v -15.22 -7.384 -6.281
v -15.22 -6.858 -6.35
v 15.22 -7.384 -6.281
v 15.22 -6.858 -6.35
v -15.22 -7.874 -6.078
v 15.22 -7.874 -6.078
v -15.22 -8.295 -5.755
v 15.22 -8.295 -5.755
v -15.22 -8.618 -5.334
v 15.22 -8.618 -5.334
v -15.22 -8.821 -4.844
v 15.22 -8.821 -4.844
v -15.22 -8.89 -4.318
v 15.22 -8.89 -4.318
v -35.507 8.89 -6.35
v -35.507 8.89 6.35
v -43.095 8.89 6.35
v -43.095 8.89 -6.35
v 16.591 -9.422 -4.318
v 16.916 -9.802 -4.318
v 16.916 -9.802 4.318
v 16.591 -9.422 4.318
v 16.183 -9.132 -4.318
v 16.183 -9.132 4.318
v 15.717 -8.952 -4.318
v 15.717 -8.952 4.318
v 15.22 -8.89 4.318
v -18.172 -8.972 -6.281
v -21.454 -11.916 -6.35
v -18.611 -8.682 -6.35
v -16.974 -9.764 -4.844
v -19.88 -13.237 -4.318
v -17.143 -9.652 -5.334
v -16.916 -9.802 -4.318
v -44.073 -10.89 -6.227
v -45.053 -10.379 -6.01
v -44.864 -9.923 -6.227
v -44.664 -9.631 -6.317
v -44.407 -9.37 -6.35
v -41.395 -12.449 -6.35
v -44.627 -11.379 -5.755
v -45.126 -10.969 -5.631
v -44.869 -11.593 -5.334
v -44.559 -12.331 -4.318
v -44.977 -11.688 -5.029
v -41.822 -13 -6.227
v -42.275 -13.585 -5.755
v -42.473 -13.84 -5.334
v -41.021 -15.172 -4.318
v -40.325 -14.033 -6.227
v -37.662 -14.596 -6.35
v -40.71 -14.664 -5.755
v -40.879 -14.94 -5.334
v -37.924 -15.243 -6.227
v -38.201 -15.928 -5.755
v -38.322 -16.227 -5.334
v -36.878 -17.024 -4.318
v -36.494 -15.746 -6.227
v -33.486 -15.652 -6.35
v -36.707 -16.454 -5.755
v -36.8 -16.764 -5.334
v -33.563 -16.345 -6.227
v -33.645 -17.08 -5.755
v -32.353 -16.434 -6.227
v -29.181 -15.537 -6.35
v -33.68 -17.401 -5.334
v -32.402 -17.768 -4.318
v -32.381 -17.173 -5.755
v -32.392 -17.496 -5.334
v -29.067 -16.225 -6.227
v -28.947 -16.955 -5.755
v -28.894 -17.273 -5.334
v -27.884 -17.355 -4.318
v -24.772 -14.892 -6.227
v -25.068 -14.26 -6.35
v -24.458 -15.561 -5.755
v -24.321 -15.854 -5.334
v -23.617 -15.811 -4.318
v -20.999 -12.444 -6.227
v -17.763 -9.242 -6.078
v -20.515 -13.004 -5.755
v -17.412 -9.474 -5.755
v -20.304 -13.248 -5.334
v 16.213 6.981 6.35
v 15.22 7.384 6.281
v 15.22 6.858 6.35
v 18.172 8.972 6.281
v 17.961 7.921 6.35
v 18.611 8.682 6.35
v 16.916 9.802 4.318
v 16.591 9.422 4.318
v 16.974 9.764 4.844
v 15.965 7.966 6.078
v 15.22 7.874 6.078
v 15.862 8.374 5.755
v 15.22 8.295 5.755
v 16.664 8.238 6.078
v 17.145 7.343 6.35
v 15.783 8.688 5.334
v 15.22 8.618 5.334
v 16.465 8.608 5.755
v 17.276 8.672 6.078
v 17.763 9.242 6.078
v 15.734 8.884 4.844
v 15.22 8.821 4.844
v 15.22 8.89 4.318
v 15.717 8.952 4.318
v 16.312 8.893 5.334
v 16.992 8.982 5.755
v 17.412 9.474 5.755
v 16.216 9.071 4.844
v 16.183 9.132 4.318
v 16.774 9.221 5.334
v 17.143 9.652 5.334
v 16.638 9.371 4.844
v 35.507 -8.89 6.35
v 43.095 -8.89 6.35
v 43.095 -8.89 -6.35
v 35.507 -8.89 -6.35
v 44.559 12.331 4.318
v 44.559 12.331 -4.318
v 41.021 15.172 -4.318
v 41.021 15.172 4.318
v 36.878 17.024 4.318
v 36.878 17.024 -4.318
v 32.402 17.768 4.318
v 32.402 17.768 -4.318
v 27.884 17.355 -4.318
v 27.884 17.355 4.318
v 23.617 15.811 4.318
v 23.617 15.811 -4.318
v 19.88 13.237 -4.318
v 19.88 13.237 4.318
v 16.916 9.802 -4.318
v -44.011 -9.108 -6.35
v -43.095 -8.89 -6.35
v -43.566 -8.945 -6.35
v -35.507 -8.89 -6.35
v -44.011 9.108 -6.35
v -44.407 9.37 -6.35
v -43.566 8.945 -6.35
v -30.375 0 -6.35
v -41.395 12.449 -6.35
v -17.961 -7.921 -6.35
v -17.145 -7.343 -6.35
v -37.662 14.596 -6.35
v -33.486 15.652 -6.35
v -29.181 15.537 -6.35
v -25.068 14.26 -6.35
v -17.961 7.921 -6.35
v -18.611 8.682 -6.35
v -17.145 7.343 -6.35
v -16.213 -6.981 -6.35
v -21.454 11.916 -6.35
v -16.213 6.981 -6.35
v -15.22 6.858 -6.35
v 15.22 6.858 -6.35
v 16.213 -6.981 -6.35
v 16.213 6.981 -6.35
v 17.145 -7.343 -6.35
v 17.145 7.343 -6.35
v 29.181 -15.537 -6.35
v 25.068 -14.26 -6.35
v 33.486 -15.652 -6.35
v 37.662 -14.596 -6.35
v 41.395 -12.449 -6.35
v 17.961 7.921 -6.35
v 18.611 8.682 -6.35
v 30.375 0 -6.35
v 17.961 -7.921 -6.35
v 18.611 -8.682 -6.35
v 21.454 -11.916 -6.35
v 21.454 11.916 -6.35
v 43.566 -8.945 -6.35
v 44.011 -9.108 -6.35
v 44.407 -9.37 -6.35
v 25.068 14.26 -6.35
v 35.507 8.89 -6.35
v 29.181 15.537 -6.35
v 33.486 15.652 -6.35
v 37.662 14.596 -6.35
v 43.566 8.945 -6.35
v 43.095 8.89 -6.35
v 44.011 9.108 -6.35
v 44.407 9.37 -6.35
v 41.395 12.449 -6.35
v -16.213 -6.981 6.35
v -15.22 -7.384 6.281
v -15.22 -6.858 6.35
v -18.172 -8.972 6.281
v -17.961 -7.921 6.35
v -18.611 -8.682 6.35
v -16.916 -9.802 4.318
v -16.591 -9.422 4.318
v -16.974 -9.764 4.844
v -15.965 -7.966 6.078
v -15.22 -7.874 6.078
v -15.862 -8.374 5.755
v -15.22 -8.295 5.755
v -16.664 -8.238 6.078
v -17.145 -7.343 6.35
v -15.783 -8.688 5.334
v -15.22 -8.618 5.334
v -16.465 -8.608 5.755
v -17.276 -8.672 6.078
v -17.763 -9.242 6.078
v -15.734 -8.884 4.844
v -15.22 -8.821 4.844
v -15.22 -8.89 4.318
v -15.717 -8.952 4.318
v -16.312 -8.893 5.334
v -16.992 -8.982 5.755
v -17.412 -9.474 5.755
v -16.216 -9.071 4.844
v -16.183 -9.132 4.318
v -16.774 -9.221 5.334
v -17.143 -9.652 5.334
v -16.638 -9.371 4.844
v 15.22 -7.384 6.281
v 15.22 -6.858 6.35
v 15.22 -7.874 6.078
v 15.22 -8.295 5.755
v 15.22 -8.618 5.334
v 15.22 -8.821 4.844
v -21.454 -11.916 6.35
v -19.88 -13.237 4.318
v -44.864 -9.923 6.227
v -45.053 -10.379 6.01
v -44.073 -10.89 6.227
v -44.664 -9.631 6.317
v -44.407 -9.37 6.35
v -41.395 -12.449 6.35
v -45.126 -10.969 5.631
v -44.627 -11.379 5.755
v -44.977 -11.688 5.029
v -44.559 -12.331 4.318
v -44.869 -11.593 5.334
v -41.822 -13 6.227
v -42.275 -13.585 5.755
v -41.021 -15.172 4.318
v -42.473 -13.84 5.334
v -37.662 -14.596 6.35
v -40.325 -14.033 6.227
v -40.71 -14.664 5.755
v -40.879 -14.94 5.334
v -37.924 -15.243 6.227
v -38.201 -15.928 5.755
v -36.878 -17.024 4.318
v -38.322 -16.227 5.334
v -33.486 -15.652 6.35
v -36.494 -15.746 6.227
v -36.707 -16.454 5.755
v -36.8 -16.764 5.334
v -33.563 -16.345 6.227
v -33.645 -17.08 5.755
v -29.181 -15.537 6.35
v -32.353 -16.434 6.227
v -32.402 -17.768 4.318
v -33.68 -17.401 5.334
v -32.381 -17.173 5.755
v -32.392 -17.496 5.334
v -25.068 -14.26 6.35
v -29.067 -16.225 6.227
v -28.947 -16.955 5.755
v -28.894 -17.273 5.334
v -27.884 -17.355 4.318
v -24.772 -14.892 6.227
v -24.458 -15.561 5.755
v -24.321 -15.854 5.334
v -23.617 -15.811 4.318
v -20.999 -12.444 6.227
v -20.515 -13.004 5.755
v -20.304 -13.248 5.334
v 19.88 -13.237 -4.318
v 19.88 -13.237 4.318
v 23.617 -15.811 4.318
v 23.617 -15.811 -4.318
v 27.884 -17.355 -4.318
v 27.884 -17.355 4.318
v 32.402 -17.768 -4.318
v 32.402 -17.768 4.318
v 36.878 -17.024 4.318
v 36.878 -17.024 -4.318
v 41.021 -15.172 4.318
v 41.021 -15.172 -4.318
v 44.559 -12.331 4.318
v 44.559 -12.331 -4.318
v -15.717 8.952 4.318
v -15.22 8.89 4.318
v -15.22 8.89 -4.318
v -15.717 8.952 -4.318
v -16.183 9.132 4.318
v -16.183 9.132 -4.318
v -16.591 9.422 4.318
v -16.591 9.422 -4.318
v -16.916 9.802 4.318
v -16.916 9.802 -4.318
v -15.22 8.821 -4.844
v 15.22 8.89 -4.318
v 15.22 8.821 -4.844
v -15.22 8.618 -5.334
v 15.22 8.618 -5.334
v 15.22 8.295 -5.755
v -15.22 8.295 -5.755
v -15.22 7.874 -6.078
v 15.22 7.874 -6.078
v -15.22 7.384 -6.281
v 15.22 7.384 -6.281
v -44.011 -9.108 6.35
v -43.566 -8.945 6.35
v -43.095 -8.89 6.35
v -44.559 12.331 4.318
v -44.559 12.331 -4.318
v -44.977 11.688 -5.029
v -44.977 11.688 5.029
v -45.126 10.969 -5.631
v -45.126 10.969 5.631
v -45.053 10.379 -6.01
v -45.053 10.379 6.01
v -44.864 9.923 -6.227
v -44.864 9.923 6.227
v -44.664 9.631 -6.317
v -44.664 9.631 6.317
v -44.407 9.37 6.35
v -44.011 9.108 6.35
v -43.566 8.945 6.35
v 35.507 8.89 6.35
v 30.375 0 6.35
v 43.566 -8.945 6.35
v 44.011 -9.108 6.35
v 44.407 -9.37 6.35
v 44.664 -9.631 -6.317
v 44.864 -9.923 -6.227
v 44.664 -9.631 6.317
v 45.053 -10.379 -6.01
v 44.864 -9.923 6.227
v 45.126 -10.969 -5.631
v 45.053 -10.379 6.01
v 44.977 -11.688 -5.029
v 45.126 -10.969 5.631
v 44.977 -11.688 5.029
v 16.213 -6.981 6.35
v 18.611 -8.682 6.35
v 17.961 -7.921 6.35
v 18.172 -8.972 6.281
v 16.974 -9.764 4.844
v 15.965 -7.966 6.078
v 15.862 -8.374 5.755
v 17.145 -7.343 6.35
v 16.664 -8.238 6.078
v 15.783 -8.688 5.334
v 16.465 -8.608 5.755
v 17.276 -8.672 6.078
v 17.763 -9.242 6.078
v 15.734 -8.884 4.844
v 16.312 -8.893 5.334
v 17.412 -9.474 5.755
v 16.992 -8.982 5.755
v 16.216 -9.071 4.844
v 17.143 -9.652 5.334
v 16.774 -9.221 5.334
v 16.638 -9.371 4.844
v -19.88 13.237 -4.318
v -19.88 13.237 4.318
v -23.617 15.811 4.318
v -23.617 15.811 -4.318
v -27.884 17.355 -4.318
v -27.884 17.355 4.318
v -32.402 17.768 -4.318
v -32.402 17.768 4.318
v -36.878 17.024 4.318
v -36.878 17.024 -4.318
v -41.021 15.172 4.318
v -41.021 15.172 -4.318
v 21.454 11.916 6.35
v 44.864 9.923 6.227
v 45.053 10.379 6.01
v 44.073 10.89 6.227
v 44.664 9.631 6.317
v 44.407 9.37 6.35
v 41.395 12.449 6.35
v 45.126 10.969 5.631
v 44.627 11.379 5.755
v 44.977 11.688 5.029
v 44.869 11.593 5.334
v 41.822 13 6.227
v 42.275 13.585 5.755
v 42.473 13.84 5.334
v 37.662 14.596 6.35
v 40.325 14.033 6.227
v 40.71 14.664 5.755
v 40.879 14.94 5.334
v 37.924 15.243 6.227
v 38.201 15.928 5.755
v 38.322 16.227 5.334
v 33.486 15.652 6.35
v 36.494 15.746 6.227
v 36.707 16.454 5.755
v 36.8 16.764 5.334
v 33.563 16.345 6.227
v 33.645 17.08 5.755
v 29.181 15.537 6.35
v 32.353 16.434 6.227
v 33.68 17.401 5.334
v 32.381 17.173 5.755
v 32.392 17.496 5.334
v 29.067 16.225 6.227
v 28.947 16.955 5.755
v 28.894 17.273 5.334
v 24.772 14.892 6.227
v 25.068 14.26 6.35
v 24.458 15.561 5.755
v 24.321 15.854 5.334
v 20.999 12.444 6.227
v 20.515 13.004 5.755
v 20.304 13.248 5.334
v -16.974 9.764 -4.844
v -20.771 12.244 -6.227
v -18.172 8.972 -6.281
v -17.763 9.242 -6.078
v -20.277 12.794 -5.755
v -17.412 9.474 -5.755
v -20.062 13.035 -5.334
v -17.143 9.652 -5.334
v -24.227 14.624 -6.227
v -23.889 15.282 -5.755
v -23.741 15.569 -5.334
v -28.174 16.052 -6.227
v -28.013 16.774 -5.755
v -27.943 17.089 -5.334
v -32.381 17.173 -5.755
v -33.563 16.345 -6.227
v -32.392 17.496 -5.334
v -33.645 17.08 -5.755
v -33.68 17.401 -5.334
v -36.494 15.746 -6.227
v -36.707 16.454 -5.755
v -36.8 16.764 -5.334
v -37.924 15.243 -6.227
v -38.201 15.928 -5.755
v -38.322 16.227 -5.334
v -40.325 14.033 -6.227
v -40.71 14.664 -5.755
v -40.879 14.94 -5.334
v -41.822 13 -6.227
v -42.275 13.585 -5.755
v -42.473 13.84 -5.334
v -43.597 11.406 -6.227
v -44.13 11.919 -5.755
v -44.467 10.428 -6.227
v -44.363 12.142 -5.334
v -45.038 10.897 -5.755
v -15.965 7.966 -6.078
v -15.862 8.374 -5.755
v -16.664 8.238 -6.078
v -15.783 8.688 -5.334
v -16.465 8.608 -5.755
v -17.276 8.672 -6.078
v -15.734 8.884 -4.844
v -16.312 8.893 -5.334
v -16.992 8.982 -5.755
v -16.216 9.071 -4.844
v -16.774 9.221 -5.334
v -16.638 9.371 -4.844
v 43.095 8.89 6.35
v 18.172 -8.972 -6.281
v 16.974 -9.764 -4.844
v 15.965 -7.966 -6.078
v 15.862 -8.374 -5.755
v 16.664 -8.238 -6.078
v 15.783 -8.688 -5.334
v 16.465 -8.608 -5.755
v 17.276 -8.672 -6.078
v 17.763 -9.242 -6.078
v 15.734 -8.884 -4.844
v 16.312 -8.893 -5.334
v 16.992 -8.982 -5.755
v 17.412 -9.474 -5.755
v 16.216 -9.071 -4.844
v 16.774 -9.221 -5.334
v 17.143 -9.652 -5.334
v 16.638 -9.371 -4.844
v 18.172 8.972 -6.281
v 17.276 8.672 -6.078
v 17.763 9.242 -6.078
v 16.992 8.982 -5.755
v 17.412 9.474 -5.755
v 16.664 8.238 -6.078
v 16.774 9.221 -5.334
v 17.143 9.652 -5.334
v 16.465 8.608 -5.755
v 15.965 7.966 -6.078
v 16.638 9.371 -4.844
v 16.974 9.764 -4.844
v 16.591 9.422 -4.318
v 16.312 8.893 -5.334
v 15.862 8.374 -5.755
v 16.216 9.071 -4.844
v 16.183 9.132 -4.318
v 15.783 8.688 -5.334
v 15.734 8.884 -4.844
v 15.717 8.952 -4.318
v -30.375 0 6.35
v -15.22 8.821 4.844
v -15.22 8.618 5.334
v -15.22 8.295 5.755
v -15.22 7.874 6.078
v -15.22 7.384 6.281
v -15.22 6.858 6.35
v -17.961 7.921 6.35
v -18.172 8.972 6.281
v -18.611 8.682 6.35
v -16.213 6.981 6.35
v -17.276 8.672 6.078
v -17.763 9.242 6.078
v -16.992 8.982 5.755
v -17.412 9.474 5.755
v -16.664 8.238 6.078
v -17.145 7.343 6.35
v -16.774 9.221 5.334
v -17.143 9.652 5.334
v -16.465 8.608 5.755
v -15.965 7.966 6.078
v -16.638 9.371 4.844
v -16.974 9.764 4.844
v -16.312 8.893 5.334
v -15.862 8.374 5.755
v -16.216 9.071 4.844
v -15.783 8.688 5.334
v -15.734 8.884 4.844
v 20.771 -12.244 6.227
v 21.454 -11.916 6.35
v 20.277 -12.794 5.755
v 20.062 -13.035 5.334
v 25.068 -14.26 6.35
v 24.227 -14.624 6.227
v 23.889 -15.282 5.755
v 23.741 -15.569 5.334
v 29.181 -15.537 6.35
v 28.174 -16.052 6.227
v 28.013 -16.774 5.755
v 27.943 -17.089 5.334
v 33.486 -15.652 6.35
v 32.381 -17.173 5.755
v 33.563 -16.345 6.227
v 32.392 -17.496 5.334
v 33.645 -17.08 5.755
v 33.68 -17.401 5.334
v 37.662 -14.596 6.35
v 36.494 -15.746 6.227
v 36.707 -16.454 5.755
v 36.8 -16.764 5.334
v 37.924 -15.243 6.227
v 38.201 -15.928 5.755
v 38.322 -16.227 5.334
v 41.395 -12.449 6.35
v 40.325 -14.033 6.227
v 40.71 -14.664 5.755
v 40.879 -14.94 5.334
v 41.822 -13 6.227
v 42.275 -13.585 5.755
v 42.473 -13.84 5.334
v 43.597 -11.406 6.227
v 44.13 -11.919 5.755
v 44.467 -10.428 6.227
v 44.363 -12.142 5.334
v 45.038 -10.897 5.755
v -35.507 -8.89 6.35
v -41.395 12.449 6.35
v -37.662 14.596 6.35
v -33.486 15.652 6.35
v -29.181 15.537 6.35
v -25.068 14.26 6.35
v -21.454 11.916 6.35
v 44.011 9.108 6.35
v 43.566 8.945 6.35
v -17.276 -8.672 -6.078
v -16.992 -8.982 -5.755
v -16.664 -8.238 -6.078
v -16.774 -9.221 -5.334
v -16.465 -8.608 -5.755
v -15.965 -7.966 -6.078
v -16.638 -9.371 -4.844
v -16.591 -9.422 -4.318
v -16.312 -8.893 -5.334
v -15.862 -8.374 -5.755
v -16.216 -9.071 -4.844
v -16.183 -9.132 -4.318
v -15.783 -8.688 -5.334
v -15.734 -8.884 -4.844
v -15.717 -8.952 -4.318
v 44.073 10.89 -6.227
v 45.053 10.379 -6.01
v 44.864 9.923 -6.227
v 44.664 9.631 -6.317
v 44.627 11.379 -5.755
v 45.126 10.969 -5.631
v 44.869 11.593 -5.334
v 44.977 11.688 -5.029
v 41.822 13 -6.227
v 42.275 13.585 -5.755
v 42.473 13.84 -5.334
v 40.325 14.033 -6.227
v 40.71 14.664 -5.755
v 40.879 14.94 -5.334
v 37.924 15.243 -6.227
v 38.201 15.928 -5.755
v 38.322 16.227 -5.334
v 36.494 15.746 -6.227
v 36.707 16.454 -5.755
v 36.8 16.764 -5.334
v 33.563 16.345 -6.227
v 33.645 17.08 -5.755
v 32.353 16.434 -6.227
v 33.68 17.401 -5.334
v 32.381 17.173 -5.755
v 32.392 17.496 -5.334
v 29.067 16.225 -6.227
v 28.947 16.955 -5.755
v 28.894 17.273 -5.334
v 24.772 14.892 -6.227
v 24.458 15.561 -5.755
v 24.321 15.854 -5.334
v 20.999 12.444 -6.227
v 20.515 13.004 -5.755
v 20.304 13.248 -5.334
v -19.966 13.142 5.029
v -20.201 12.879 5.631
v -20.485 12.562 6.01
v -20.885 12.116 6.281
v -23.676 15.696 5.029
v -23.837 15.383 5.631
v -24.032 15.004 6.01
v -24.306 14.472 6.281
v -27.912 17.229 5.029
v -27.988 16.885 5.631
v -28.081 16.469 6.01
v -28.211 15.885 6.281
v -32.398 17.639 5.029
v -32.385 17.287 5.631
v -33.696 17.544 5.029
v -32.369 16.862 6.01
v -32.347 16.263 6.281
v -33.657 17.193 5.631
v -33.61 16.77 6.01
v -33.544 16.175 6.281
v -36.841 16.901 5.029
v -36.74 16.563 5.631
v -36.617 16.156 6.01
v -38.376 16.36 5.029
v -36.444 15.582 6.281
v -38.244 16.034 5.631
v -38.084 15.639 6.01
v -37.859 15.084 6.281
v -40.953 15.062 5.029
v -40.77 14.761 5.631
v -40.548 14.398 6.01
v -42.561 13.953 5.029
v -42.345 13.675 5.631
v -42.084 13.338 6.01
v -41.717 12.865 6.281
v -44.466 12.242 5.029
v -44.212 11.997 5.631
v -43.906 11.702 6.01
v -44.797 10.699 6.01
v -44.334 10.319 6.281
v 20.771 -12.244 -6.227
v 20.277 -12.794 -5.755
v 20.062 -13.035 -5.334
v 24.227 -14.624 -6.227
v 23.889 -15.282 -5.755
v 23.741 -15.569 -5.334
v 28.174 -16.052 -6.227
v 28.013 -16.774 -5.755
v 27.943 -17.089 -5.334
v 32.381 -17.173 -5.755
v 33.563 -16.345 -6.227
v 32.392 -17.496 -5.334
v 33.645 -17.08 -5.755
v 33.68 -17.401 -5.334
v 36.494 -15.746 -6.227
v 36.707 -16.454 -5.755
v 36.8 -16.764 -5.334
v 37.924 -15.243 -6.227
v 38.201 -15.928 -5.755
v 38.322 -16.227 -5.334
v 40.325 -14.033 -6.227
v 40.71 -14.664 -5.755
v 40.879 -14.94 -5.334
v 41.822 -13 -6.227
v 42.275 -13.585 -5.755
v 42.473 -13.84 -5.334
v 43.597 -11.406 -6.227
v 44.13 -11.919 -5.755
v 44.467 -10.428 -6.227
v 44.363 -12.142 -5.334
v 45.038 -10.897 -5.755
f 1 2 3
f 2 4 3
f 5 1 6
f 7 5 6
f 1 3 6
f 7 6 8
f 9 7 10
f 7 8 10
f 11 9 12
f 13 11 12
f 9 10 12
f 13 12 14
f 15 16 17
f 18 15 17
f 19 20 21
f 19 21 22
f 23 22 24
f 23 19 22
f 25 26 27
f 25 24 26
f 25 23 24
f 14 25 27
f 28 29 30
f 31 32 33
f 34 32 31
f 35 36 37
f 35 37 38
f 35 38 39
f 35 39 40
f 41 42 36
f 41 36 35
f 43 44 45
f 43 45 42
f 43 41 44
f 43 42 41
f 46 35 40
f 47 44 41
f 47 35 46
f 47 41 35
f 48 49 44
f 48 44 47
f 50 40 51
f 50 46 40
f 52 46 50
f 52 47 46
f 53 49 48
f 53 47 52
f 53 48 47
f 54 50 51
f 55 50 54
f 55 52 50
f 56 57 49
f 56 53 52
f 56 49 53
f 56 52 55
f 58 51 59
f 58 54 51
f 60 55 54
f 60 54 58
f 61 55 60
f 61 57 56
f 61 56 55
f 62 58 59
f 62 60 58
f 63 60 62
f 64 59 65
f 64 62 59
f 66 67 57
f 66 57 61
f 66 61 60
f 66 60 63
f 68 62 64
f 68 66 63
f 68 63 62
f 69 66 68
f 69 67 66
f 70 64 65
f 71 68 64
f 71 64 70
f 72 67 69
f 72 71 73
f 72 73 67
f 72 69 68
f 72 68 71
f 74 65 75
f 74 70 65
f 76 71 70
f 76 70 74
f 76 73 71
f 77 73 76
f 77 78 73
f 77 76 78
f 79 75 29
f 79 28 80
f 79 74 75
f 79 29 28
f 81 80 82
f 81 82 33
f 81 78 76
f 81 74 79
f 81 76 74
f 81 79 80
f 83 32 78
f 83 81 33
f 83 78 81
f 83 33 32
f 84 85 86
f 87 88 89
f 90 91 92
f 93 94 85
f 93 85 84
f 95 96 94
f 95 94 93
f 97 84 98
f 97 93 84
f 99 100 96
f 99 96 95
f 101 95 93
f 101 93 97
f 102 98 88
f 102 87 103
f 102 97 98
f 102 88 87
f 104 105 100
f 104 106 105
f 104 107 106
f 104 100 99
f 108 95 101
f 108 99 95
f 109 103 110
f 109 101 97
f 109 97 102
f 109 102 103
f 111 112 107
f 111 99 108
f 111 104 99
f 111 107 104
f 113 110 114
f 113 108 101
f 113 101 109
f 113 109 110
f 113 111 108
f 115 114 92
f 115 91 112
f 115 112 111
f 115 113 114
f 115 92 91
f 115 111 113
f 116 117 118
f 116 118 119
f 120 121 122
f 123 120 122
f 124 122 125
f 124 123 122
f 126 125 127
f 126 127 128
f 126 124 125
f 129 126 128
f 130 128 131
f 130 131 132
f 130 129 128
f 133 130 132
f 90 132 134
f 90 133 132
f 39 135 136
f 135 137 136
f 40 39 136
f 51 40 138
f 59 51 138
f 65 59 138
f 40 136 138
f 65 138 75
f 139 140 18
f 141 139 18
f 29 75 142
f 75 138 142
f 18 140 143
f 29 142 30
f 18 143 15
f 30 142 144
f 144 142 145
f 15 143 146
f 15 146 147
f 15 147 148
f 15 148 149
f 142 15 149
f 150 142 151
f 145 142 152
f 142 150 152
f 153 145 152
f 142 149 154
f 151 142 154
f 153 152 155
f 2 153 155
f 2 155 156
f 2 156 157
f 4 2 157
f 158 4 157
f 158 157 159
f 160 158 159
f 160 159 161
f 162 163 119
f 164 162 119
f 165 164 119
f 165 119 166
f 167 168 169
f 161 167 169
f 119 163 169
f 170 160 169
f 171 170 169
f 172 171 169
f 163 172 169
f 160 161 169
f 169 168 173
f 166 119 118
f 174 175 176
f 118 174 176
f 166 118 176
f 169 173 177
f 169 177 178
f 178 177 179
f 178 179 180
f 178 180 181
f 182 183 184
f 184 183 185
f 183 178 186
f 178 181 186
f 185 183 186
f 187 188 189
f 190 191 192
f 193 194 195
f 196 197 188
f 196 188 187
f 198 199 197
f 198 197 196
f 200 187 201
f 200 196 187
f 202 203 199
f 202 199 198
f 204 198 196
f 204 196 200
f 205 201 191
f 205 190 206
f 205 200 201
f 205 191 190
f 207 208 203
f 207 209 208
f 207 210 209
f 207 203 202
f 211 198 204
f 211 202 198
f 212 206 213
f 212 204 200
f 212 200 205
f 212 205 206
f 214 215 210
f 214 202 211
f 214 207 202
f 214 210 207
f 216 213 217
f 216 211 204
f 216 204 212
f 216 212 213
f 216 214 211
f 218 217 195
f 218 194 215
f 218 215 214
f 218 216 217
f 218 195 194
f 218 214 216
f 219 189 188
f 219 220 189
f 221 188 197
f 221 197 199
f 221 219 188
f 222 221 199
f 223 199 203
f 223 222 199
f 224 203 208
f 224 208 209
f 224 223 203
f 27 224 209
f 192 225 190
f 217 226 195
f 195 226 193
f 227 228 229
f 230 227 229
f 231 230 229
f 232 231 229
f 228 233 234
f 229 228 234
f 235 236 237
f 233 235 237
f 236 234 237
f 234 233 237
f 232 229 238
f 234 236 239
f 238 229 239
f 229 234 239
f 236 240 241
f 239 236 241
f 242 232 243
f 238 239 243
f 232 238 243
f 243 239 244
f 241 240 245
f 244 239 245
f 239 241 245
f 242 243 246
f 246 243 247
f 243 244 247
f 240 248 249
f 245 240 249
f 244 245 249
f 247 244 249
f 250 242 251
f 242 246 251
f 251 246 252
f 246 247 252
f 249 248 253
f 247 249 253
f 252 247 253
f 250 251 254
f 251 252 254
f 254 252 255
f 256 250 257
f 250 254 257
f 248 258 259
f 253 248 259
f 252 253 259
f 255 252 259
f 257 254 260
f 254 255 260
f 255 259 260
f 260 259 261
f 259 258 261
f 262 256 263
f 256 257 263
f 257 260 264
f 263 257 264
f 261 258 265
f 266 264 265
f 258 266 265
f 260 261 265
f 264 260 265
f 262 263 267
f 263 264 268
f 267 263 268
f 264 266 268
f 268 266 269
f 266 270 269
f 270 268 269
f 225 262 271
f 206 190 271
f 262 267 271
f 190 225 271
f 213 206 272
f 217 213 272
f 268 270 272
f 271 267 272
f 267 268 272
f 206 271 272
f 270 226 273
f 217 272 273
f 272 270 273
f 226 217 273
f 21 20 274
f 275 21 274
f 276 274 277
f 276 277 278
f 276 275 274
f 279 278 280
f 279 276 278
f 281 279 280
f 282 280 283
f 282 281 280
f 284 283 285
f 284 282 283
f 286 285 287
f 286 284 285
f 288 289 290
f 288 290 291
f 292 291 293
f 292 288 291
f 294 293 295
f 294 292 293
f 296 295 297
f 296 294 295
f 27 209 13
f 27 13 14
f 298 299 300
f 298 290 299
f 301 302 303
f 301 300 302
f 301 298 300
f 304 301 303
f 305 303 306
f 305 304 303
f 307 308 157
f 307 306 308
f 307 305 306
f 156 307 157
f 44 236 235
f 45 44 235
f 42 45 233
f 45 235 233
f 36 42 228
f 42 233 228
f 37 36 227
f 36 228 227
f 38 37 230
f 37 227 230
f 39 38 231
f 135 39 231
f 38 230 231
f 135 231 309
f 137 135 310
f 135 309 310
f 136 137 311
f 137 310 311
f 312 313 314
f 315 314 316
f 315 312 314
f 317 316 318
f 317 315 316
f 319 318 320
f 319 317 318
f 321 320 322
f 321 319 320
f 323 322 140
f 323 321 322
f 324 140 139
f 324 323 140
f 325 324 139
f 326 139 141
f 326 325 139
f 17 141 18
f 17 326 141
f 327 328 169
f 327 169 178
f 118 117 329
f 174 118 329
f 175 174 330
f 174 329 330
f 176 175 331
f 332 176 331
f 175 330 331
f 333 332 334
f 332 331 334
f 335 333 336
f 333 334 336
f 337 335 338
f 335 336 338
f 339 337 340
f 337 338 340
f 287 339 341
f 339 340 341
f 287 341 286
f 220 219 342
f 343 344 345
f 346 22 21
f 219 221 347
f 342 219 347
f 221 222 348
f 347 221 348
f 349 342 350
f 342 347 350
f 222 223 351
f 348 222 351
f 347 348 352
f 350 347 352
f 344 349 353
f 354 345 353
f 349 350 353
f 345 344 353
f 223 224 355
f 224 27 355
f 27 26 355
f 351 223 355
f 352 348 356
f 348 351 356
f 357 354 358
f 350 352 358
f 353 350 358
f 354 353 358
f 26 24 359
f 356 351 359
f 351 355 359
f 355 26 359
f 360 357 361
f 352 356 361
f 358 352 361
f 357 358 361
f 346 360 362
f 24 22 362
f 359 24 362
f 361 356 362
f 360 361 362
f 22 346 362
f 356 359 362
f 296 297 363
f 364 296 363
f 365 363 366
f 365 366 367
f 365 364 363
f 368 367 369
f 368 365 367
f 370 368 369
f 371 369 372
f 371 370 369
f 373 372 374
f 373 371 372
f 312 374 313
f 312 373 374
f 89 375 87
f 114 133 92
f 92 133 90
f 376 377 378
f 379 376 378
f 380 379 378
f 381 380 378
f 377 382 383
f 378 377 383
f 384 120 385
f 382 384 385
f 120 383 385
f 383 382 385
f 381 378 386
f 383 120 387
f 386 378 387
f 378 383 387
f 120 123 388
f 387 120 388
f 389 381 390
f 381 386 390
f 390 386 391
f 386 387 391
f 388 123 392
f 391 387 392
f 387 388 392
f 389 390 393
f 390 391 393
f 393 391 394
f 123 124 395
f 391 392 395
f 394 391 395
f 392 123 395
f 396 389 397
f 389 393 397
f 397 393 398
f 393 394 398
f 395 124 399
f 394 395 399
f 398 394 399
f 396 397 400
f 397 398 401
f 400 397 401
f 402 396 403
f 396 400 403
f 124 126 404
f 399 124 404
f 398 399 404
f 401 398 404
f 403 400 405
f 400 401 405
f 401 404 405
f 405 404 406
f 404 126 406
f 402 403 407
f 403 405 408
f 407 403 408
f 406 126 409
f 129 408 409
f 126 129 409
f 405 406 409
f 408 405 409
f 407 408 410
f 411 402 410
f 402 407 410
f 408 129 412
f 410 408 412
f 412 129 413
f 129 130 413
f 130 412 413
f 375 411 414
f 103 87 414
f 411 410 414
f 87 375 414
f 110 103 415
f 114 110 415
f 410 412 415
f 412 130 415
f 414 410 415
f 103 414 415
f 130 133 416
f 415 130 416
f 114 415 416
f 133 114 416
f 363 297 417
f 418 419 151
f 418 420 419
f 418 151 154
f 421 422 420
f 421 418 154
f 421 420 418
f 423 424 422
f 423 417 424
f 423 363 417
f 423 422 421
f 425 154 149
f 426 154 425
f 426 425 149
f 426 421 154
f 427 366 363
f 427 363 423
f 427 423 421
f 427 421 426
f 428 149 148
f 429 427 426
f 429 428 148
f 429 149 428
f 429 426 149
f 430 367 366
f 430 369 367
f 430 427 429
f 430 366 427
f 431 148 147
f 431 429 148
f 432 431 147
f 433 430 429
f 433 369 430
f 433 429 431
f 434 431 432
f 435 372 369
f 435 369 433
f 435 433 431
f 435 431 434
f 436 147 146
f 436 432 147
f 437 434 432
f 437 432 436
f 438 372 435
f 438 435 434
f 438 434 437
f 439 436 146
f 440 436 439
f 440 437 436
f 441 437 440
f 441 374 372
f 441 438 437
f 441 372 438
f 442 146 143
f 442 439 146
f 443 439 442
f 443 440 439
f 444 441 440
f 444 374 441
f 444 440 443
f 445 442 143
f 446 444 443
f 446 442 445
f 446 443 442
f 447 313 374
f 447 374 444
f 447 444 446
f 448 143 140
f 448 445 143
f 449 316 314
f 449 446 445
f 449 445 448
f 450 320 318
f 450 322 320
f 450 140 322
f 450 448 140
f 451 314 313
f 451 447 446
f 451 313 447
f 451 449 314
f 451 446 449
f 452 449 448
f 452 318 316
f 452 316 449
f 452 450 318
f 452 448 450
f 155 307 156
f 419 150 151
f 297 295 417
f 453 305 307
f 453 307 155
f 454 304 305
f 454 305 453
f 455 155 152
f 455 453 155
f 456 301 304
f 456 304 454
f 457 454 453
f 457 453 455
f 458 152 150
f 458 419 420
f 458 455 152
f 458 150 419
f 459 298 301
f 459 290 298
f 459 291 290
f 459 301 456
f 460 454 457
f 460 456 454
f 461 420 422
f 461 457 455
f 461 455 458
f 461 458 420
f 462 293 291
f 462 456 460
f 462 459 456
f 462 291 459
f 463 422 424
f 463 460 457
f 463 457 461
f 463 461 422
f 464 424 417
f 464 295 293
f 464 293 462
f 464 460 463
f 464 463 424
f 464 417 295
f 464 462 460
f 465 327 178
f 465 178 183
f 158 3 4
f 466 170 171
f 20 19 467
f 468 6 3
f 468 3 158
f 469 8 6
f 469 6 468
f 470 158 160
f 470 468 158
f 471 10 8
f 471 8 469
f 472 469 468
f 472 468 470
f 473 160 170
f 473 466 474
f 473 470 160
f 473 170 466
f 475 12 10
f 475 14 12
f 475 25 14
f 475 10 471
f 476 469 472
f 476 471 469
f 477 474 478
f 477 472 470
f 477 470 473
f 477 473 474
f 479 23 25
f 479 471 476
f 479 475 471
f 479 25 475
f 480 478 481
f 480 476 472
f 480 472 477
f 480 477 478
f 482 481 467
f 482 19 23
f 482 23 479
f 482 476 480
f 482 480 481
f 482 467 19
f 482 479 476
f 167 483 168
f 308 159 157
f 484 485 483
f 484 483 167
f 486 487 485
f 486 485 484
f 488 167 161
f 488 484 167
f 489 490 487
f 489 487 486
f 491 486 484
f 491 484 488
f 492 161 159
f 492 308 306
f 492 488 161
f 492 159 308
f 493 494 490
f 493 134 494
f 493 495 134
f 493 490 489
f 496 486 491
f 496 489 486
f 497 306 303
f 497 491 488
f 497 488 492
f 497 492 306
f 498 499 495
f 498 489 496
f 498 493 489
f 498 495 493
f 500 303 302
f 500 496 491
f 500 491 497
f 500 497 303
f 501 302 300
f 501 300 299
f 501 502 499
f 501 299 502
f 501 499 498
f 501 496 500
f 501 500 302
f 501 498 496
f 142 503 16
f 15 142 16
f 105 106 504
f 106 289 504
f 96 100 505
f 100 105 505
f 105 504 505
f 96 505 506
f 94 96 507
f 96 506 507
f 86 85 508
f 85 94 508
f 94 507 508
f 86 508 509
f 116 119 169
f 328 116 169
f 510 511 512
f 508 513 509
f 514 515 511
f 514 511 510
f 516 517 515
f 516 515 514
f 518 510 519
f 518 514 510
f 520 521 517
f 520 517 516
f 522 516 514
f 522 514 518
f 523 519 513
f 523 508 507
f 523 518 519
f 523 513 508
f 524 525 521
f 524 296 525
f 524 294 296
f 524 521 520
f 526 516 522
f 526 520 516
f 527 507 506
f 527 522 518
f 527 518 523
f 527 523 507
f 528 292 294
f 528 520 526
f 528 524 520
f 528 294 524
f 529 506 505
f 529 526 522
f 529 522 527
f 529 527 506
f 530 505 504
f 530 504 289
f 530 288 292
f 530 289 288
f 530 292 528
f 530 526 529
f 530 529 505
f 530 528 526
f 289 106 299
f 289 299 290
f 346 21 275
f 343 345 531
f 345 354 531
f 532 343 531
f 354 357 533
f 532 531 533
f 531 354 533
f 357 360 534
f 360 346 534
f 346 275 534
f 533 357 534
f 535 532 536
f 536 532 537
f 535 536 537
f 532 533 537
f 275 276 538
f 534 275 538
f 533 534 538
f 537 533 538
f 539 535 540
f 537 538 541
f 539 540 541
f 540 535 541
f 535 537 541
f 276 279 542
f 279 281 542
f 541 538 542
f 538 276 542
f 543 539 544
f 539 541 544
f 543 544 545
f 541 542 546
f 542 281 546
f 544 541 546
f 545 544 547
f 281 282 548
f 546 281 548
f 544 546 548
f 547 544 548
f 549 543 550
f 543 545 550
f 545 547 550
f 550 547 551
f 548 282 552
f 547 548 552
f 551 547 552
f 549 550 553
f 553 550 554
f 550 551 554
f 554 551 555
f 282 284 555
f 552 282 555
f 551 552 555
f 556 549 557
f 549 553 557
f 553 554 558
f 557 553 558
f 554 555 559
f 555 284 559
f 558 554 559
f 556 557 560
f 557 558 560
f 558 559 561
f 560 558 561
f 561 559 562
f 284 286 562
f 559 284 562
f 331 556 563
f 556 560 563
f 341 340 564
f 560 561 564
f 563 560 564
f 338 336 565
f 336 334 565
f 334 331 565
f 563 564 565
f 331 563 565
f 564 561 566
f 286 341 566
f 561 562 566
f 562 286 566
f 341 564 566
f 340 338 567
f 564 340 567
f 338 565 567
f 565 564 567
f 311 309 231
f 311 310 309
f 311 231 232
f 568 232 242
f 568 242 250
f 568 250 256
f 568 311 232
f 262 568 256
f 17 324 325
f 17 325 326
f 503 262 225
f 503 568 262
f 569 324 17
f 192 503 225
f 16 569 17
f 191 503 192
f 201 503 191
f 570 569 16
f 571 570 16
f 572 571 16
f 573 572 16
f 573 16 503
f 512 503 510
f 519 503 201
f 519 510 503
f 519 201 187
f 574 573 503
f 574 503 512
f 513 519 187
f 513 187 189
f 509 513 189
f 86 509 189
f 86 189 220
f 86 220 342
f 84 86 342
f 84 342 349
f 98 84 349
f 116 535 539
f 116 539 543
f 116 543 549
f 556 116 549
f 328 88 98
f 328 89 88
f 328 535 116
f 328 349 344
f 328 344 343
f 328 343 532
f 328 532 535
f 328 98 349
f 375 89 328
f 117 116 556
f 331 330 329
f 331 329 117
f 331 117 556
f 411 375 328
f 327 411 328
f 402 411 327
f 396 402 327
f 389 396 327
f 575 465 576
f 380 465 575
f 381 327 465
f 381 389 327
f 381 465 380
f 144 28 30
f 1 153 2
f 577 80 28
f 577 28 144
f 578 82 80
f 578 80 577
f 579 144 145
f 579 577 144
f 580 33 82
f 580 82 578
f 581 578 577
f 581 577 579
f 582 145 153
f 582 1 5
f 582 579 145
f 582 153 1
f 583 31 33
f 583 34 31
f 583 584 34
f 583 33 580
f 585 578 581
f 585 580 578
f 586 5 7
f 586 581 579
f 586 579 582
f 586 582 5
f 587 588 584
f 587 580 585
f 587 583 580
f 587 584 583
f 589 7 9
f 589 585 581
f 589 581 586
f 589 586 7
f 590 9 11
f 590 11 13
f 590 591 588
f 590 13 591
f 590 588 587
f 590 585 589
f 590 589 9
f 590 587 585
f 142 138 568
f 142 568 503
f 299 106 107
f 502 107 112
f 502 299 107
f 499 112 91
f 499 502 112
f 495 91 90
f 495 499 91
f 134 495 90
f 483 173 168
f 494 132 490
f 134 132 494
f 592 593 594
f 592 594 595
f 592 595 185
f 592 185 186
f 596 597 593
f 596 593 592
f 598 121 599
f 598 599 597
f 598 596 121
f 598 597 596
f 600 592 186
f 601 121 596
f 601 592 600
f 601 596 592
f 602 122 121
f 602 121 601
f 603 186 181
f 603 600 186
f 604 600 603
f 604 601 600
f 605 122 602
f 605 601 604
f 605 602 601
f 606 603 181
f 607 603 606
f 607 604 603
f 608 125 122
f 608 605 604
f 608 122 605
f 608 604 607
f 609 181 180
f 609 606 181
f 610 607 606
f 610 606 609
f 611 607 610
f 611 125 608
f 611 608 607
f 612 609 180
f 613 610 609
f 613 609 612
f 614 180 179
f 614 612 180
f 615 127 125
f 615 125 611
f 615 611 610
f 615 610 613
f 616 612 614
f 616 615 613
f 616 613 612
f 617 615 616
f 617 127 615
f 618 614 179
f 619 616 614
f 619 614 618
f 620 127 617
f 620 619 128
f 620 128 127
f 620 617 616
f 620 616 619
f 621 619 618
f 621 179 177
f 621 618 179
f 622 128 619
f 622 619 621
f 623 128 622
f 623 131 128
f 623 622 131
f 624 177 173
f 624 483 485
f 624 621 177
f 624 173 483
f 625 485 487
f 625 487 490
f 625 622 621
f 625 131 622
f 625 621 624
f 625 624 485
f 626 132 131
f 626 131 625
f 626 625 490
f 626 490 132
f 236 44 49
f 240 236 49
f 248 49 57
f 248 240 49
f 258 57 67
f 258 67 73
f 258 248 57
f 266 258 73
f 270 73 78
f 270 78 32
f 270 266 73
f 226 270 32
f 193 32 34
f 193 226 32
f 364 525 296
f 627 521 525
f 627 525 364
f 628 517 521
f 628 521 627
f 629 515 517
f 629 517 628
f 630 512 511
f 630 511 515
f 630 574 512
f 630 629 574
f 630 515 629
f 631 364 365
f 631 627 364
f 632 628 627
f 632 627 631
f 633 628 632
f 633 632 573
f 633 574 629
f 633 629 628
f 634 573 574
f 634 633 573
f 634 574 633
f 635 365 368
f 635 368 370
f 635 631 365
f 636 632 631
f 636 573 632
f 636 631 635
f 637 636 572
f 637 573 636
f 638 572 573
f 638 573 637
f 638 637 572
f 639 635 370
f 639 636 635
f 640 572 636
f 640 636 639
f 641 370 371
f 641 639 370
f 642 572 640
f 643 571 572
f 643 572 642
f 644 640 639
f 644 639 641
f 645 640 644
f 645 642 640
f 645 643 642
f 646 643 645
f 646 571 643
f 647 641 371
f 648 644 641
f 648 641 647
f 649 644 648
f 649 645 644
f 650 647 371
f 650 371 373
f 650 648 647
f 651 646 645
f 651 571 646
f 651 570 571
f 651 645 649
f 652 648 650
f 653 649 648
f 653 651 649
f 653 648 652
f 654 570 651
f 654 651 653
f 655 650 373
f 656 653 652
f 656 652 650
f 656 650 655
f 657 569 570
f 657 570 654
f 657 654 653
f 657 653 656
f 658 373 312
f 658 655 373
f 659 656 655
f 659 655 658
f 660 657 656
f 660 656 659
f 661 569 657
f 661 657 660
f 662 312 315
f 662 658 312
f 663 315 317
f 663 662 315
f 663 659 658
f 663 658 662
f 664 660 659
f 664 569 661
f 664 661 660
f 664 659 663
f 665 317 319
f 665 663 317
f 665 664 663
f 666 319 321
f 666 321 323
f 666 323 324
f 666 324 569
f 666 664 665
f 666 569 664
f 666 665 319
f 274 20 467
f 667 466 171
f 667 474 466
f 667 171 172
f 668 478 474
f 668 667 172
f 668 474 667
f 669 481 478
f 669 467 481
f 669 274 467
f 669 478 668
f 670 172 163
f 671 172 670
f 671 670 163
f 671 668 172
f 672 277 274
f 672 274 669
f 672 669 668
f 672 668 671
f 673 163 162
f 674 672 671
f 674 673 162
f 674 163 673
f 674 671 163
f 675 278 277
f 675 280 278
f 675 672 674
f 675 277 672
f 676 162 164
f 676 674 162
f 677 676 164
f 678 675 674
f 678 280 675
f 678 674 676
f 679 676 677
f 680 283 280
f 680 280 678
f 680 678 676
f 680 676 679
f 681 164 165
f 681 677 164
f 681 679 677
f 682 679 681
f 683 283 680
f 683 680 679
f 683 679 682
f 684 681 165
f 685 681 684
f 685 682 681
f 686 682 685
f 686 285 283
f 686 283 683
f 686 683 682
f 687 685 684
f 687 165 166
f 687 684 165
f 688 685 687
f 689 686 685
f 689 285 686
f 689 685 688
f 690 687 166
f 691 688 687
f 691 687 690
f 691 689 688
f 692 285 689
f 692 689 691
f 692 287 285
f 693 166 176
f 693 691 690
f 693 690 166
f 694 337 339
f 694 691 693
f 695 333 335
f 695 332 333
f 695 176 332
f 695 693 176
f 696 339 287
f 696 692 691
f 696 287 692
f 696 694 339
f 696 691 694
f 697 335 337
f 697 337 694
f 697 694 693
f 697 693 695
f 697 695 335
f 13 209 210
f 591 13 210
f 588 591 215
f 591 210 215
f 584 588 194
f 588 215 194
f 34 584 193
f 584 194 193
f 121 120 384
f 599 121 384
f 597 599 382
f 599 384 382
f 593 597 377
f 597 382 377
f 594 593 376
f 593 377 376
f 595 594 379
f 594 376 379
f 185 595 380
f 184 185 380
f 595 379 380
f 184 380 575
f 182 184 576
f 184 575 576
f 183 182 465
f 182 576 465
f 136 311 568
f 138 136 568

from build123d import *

# Parameters (mm, degrees)
F1_DEPTH = 6.35
F3_DEPTH = 12.701
F7_R     = 2.032


# Not quite as in the source:
# - a feature of the source that left no trace in its solid (it failed there, or was rolled back) is left out


with BuildPart() as f1:
    # F0 (on Top) → F1 (new body, symmetric)
    with BuildSketch(Plane.XY):
        with BuildLine():
            Line((16.3520683207, 8.89), (-16.3520683207, 8.89))
            ThreePointArc((-16.3520683207, 8.89), (-49.53, 0), (-16.3520683207, -8.89))
            Line((-16.3520683207, -8.89), (16.3520683207, -8.89))
            ThreePointArc((16.3520683207, -8.89), (49.53, 0), (16.3520683207, 8.89))
        make_face()
    extrude(amount=F1_DEPTH, both=True)

    # F4: F3 across plane


with BuildPart() as f3:
    # F2 (on face) → F3 (new body, through all)
    with BuildSketch(Plane.XY.offset(6.35)):
        Polygon((-35.5073561069, -8.89), (-30.3747122138, 0), (-35.5073561069, 8.89), (-45.7726438931, 8.89), (-49.53, 8.89), (-49.53, 0), (-49.53, -8.89), (-45.7726438931, -8.89), align=None)
    extrude(amount=-F3_DEPTH)


with BuildPart() as f1_1:
    add(f1.part)
    add(f3.part.mirror(Plane.YZ), mode=Mode.SUBTRACT)

    # F5: cut F3
    add(f3.part, mode=Mode.SUBTRACT)

    # F7
    f7_edges = [f1_1.edges().sort_by_distance(p)[0] for p in [
        (0, -8.89, 6.35),
        (-31.75, -17.78, 6.35),
        (-31.75, 17.78, 6.35),
        (0, 8.89, 6.35),
        (31.75, 17.78, 6.35),
        (31.75, -17.78, 6.35),
        (-31.75, -17.78, -6.35),
        (0, -8.89, -6.35),
        (31.75, -17.78, -6.35),
        (31.75, 17.78, -6.35),
        (0, 8.89, -6.35),
        (-31.75, 17.78, -6.35),
        (-16.352068, -8.89, 0),
        (16.352068, -8.89, 0),
        (-16.352068, 8.89, 0),
        (16.352068, 8.89, 0),
        (-47.147932, 8.89, 0),
        (47.147932, 8.89, 0),
        (47.147932, -8.89, 0),
        (-47.147932, -8.89, 0),
    ]]
    fillet(f7_edges, radius=F7_R)


solid = f1_1.part
